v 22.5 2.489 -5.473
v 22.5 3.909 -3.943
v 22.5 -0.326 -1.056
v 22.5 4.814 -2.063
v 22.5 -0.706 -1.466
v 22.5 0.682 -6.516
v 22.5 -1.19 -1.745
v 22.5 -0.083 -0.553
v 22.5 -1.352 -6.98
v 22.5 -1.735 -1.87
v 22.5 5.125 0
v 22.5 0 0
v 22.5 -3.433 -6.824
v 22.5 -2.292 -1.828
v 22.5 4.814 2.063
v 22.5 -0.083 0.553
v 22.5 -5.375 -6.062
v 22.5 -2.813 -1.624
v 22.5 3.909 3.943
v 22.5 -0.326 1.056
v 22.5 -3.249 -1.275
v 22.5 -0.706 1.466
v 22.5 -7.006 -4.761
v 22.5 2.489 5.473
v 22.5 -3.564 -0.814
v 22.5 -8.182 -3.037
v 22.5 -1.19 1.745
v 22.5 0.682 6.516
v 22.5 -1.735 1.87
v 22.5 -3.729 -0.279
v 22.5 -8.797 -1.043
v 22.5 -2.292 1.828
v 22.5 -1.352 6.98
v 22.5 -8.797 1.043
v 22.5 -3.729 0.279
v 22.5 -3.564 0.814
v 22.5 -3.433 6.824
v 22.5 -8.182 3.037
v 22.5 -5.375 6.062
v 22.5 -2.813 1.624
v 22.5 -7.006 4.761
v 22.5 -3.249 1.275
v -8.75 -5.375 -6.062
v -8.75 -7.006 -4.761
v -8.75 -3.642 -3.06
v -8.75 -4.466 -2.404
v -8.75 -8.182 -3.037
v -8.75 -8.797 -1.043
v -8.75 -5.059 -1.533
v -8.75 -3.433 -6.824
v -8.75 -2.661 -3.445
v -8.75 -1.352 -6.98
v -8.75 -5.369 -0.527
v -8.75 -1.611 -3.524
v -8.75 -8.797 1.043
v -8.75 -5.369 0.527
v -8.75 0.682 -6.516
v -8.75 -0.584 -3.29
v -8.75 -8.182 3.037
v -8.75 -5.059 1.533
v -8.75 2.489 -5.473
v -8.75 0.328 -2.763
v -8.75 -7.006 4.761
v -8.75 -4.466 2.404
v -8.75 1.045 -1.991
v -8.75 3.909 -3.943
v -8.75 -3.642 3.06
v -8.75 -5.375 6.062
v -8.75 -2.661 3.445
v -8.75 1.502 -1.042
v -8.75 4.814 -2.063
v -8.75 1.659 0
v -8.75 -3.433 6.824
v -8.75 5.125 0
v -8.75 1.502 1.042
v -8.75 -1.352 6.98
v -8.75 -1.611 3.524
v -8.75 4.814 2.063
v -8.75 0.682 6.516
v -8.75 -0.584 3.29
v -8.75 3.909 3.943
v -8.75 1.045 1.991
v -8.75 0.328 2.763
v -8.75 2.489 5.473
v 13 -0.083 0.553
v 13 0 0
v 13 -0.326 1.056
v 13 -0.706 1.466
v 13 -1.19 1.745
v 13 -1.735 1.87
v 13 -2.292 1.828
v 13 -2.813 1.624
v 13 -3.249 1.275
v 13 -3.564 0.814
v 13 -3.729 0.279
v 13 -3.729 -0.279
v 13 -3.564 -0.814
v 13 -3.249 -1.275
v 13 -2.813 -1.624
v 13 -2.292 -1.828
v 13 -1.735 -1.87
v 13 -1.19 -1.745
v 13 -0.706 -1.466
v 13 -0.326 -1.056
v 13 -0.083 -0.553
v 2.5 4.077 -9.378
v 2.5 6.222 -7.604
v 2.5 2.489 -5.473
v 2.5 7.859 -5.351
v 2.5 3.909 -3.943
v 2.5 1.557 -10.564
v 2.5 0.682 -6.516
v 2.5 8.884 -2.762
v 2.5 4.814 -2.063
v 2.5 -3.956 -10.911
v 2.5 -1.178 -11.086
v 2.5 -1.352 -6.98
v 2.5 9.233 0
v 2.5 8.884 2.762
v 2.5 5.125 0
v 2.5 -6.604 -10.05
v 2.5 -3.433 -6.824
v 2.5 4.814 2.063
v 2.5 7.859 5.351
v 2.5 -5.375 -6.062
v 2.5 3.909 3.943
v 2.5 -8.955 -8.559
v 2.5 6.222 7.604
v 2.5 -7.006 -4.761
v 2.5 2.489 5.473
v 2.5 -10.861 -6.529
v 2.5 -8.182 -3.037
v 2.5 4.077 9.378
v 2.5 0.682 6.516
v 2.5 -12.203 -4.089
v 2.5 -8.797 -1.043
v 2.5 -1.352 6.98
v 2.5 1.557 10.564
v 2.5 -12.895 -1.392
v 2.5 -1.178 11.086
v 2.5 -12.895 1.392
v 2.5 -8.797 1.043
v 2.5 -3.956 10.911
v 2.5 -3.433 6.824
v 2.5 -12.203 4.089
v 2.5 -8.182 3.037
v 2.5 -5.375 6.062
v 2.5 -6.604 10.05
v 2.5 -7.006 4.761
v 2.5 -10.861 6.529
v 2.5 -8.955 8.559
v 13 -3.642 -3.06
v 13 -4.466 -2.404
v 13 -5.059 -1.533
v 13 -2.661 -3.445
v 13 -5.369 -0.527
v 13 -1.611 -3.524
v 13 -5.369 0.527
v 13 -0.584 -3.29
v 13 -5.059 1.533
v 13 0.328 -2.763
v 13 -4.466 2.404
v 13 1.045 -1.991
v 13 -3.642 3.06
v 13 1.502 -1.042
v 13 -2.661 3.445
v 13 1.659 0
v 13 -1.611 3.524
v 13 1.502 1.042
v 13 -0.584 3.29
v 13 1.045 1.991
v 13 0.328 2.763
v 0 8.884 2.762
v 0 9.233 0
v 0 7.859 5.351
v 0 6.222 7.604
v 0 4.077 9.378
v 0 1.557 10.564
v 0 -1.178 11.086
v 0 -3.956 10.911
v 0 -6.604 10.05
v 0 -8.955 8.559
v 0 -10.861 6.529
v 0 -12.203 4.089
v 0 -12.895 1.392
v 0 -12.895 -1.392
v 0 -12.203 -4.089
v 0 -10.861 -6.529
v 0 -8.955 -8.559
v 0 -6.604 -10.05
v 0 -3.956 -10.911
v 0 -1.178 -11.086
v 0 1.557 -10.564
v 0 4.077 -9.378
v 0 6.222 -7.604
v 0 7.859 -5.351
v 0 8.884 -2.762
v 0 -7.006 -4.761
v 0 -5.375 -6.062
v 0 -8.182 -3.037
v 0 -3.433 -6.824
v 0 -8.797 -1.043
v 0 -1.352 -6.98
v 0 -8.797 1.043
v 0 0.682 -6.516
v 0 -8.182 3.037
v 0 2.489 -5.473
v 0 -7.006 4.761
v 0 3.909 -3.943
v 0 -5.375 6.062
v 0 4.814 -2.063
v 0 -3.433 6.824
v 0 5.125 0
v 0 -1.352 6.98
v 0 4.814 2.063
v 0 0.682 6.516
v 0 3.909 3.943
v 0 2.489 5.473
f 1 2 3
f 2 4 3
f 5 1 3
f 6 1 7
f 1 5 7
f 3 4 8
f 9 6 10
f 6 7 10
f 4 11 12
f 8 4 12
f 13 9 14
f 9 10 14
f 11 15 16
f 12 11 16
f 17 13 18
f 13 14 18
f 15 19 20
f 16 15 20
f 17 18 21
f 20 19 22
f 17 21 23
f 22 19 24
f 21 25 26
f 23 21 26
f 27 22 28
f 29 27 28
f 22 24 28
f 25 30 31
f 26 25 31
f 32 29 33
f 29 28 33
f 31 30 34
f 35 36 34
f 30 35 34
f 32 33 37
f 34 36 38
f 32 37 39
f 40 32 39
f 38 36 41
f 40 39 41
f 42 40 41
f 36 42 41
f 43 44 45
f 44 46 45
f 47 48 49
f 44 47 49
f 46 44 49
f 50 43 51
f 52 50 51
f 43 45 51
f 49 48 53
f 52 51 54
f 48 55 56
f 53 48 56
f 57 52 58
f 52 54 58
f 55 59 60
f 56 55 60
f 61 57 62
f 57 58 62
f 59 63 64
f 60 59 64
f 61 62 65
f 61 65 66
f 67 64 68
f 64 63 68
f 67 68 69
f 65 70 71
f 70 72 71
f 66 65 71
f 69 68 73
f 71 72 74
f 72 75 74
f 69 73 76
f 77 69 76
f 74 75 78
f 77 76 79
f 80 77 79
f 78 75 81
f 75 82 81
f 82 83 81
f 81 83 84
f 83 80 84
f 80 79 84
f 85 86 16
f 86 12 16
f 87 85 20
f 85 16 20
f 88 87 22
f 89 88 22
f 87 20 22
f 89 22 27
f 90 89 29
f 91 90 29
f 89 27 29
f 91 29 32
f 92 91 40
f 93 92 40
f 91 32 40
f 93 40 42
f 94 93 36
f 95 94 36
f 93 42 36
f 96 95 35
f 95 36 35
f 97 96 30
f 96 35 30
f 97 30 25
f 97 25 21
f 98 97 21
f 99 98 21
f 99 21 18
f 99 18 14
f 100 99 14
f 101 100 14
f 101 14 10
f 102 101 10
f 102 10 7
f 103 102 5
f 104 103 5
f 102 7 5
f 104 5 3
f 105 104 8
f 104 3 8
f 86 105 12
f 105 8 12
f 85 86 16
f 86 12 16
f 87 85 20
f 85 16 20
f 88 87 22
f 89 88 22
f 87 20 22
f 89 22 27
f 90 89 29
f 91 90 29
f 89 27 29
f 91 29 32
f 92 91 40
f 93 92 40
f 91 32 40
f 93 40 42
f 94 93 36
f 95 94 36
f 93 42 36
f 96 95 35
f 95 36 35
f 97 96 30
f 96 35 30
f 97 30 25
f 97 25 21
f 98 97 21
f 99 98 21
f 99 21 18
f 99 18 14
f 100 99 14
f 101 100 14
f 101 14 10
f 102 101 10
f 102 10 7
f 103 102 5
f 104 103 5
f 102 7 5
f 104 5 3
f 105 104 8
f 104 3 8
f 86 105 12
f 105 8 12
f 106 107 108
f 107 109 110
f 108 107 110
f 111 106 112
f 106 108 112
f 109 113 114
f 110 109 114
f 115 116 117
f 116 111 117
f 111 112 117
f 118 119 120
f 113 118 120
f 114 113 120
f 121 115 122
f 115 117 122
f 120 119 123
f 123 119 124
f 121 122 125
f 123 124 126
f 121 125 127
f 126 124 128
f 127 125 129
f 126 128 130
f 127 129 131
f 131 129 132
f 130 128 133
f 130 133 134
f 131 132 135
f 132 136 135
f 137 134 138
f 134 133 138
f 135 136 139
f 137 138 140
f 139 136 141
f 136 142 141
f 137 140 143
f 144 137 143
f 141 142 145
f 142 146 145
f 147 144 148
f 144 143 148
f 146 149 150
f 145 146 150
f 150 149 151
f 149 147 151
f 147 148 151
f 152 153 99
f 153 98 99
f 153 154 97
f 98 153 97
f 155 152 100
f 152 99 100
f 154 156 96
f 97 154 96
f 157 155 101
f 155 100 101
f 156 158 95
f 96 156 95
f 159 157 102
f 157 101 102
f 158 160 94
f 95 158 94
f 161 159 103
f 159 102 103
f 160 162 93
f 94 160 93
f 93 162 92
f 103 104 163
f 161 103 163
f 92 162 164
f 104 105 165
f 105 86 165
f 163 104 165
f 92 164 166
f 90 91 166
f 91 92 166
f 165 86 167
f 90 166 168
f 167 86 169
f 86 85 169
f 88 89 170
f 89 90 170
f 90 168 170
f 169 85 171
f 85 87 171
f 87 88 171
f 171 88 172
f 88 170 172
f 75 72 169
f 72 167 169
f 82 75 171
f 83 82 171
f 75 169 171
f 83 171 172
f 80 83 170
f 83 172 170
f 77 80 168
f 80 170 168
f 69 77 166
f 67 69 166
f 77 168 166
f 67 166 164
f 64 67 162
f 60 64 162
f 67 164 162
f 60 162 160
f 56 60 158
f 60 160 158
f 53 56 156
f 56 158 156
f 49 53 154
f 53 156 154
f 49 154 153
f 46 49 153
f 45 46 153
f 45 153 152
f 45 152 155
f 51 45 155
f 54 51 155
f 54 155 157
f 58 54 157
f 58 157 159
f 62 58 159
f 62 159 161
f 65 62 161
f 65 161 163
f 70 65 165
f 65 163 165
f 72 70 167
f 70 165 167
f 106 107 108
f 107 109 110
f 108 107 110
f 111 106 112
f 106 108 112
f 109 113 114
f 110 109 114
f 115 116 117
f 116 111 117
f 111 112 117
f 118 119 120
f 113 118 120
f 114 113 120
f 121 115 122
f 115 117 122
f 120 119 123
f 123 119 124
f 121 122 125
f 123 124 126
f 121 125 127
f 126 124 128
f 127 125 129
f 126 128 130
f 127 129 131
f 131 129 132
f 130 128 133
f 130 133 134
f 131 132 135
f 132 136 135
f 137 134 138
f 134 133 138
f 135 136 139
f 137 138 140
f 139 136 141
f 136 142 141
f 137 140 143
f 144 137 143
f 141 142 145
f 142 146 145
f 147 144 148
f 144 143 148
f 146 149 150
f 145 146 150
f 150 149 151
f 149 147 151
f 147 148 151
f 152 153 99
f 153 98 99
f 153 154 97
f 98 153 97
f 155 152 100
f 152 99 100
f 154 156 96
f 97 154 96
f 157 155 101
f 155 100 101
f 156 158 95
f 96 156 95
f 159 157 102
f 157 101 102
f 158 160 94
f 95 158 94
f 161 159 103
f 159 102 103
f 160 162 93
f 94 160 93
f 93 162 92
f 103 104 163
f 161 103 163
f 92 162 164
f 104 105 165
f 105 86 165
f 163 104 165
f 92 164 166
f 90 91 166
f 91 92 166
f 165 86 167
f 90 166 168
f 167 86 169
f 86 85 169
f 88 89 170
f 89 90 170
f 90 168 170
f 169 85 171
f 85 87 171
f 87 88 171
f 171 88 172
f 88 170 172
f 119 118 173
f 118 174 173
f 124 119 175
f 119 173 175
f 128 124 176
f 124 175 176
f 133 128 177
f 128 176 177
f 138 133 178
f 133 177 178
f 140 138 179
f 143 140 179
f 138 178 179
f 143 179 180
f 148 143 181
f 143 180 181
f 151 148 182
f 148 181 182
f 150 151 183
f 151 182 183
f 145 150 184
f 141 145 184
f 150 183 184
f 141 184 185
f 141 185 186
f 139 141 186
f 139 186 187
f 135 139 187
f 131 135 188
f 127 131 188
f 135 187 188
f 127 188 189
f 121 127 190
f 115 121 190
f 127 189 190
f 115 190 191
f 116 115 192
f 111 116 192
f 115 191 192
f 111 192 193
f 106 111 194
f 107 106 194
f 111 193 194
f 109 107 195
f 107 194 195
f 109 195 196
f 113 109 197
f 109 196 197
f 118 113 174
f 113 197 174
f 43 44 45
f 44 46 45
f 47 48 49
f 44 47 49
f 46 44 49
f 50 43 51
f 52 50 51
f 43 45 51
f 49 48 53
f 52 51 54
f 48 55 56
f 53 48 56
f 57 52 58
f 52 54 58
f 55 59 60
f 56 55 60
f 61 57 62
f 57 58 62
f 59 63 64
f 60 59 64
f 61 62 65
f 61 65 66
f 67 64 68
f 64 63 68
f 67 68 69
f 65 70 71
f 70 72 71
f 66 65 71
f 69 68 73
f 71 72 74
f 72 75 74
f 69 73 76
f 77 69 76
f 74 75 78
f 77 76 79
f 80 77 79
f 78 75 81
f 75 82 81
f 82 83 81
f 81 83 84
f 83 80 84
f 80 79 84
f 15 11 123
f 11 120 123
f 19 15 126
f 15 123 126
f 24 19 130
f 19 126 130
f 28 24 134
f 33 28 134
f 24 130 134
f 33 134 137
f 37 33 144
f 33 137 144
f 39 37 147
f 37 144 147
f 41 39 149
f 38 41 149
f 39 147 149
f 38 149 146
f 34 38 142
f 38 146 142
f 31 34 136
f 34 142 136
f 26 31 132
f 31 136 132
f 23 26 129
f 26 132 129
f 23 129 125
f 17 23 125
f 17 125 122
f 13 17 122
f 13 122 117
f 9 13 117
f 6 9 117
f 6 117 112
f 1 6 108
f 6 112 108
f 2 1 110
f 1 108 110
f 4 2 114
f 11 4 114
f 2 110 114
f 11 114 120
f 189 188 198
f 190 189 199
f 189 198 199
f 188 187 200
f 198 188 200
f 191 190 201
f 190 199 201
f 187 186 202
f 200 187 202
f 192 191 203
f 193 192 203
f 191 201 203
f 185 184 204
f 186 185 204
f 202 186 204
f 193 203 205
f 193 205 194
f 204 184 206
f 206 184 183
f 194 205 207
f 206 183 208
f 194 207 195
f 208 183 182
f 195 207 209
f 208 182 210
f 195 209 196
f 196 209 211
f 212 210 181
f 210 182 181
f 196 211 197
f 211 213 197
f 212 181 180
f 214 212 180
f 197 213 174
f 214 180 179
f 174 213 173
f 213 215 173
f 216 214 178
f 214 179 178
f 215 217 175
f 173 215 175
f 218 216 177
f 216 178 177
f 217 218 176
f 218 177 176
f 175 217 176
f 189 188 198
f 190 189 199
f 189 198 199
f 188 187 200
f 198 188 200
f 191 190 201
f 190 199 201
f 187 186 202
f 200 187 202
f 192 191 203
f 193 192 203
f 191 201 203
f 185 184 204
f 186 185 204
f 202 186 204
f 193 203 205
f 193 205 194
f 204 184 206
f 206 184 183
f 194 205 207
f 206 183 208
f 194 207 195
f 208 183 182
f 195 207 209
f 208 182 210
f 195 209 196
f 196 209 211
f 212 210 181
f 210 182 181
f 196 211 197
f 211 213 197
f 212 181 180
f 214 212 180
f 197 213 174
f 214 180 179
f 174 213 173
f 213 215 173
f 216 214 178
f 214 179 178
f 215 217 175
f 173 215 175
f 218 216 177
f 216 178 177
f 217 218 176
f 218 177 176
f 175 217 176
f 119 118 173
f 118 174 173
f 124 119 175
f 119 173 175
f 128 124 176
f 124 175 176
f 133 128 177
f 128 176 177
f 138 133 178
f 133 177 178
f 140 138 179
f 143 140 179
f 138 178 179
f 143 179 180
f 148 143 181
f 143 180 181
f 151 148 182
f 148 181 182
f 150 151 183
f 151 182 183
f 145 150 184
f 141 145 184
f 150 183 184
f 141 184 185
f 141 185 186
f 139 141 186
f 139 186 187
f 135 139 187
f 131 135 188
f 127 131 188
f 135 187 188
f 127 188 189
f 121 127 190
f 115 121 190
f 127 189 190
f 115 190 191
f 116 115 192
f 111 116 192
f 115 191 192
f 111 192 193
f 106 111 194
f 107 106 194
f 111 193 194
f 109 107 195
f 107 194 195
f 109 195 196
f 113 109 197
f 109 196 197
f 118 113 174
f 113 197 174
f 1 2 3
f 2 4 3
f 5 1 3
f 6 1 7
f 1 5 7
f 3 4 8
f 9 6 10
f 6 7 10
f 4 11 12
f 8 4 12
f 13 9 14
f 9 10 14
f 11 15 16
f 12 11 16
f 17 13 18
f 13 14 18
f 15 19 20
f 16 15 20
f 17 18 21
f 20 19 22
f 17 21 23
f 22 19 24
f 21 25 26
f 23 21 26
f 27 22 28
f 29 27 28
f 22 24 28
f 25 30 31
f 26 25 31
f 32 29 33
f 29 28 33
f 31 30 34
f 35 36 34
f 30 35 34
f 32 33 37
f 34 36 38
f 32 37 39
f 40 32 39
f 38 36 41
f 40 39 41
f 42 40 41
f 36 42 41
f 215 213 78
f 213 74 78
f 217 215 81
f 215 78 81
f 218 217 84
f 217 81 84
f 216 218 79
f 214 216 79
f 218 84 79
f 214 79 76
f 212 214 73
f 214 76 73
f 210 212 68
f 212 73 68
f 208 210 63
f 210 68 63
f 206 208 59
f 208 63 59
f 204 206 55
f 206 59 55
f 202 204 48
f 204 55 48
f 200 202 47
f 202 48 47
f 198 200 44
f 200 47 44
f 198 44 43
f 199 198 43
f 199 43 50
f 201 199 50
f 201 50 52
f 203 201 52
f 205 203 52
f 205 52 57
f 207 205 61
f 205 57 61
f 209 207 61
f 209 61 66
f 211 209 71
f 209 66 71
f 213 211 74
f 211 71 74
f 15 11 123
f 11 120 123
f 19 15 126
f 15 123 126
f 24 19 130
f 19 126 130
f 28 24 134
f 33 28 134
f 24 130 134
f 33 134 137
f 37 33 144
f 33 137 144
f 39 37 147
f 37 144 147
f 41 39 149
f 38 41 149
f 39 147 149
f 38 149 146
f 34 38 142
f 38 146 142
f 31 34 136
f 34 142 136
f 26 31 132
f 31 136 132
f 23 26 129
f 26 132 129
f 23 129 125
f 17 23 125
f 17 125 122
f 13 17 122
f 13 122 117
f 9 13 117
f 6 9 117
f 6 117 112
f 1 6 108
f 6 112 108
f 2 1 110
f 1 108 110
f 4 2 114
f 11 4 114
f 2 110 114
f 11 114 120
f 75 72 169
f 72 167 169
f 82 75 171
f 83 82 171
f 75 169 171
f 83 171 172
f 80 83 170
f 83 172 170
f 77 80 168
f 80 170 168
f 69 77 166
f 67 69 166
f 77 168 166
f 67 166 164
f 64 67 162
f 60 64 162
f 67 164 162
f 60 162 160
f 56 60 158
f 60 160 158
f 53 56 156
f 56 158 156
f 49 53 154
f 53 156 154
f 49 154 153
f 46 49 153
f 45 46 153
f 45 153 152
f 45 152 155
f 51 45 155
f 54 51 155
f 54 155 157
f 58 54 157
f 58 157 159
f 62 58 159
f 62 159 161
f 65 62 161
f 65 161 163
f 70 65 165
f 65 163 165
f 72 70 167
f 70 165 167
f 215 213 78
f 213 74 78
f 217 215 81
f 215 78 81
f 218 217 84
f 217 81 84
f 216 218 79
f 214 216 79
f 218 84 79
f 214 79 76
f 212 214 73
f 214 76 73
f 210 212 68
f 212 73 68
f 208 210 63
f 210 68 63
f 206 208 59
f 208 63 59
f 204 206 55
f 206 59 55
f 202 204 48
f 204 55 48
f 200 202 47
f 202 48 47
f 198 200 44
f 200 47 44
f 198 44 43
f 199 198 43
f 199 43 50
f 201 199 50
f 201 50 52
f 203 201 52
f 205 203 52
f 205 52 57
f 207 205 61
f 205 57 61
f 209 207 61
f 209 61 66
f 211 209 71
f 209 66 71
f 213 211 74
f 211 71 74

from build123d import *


with BuildPart() as f1:
    # F0 (on Top) → F1 (revolve)
    with BuildSketch(Plane.XY):
        Polygon((-8.75, 5.125), (-8.75, 1.658865), (13, 1.658865), (13, 0), (22.5, 0), (22.5, 5.125), (2.5, 5.125), (2.5, 9.232625), (0, 9.232625), (0, 5.125), align=None)
    revolve(axis=Axis((7.169014, -1.875, 0), (1, 0, 0)))


with BuildPart() as f2:
    # F0 (on Top) → F2 (revolve)
    with BuildSketch(Plane.XY):
        Polygon((-8.75, 5.125), (-8.75, 1.658865), (13, 1.658865), (13, 0), (22.5, 0), (22.5, 5.125), (2.5, 5.125), (2.5, 9.232625), (0, 9.232625), (0, 5.125), align=None)
    revolve(axis=Axis((7.169014, -1.875, 0), (1, 0, 0)))


solid = Compound([f1.part, f2.part])
